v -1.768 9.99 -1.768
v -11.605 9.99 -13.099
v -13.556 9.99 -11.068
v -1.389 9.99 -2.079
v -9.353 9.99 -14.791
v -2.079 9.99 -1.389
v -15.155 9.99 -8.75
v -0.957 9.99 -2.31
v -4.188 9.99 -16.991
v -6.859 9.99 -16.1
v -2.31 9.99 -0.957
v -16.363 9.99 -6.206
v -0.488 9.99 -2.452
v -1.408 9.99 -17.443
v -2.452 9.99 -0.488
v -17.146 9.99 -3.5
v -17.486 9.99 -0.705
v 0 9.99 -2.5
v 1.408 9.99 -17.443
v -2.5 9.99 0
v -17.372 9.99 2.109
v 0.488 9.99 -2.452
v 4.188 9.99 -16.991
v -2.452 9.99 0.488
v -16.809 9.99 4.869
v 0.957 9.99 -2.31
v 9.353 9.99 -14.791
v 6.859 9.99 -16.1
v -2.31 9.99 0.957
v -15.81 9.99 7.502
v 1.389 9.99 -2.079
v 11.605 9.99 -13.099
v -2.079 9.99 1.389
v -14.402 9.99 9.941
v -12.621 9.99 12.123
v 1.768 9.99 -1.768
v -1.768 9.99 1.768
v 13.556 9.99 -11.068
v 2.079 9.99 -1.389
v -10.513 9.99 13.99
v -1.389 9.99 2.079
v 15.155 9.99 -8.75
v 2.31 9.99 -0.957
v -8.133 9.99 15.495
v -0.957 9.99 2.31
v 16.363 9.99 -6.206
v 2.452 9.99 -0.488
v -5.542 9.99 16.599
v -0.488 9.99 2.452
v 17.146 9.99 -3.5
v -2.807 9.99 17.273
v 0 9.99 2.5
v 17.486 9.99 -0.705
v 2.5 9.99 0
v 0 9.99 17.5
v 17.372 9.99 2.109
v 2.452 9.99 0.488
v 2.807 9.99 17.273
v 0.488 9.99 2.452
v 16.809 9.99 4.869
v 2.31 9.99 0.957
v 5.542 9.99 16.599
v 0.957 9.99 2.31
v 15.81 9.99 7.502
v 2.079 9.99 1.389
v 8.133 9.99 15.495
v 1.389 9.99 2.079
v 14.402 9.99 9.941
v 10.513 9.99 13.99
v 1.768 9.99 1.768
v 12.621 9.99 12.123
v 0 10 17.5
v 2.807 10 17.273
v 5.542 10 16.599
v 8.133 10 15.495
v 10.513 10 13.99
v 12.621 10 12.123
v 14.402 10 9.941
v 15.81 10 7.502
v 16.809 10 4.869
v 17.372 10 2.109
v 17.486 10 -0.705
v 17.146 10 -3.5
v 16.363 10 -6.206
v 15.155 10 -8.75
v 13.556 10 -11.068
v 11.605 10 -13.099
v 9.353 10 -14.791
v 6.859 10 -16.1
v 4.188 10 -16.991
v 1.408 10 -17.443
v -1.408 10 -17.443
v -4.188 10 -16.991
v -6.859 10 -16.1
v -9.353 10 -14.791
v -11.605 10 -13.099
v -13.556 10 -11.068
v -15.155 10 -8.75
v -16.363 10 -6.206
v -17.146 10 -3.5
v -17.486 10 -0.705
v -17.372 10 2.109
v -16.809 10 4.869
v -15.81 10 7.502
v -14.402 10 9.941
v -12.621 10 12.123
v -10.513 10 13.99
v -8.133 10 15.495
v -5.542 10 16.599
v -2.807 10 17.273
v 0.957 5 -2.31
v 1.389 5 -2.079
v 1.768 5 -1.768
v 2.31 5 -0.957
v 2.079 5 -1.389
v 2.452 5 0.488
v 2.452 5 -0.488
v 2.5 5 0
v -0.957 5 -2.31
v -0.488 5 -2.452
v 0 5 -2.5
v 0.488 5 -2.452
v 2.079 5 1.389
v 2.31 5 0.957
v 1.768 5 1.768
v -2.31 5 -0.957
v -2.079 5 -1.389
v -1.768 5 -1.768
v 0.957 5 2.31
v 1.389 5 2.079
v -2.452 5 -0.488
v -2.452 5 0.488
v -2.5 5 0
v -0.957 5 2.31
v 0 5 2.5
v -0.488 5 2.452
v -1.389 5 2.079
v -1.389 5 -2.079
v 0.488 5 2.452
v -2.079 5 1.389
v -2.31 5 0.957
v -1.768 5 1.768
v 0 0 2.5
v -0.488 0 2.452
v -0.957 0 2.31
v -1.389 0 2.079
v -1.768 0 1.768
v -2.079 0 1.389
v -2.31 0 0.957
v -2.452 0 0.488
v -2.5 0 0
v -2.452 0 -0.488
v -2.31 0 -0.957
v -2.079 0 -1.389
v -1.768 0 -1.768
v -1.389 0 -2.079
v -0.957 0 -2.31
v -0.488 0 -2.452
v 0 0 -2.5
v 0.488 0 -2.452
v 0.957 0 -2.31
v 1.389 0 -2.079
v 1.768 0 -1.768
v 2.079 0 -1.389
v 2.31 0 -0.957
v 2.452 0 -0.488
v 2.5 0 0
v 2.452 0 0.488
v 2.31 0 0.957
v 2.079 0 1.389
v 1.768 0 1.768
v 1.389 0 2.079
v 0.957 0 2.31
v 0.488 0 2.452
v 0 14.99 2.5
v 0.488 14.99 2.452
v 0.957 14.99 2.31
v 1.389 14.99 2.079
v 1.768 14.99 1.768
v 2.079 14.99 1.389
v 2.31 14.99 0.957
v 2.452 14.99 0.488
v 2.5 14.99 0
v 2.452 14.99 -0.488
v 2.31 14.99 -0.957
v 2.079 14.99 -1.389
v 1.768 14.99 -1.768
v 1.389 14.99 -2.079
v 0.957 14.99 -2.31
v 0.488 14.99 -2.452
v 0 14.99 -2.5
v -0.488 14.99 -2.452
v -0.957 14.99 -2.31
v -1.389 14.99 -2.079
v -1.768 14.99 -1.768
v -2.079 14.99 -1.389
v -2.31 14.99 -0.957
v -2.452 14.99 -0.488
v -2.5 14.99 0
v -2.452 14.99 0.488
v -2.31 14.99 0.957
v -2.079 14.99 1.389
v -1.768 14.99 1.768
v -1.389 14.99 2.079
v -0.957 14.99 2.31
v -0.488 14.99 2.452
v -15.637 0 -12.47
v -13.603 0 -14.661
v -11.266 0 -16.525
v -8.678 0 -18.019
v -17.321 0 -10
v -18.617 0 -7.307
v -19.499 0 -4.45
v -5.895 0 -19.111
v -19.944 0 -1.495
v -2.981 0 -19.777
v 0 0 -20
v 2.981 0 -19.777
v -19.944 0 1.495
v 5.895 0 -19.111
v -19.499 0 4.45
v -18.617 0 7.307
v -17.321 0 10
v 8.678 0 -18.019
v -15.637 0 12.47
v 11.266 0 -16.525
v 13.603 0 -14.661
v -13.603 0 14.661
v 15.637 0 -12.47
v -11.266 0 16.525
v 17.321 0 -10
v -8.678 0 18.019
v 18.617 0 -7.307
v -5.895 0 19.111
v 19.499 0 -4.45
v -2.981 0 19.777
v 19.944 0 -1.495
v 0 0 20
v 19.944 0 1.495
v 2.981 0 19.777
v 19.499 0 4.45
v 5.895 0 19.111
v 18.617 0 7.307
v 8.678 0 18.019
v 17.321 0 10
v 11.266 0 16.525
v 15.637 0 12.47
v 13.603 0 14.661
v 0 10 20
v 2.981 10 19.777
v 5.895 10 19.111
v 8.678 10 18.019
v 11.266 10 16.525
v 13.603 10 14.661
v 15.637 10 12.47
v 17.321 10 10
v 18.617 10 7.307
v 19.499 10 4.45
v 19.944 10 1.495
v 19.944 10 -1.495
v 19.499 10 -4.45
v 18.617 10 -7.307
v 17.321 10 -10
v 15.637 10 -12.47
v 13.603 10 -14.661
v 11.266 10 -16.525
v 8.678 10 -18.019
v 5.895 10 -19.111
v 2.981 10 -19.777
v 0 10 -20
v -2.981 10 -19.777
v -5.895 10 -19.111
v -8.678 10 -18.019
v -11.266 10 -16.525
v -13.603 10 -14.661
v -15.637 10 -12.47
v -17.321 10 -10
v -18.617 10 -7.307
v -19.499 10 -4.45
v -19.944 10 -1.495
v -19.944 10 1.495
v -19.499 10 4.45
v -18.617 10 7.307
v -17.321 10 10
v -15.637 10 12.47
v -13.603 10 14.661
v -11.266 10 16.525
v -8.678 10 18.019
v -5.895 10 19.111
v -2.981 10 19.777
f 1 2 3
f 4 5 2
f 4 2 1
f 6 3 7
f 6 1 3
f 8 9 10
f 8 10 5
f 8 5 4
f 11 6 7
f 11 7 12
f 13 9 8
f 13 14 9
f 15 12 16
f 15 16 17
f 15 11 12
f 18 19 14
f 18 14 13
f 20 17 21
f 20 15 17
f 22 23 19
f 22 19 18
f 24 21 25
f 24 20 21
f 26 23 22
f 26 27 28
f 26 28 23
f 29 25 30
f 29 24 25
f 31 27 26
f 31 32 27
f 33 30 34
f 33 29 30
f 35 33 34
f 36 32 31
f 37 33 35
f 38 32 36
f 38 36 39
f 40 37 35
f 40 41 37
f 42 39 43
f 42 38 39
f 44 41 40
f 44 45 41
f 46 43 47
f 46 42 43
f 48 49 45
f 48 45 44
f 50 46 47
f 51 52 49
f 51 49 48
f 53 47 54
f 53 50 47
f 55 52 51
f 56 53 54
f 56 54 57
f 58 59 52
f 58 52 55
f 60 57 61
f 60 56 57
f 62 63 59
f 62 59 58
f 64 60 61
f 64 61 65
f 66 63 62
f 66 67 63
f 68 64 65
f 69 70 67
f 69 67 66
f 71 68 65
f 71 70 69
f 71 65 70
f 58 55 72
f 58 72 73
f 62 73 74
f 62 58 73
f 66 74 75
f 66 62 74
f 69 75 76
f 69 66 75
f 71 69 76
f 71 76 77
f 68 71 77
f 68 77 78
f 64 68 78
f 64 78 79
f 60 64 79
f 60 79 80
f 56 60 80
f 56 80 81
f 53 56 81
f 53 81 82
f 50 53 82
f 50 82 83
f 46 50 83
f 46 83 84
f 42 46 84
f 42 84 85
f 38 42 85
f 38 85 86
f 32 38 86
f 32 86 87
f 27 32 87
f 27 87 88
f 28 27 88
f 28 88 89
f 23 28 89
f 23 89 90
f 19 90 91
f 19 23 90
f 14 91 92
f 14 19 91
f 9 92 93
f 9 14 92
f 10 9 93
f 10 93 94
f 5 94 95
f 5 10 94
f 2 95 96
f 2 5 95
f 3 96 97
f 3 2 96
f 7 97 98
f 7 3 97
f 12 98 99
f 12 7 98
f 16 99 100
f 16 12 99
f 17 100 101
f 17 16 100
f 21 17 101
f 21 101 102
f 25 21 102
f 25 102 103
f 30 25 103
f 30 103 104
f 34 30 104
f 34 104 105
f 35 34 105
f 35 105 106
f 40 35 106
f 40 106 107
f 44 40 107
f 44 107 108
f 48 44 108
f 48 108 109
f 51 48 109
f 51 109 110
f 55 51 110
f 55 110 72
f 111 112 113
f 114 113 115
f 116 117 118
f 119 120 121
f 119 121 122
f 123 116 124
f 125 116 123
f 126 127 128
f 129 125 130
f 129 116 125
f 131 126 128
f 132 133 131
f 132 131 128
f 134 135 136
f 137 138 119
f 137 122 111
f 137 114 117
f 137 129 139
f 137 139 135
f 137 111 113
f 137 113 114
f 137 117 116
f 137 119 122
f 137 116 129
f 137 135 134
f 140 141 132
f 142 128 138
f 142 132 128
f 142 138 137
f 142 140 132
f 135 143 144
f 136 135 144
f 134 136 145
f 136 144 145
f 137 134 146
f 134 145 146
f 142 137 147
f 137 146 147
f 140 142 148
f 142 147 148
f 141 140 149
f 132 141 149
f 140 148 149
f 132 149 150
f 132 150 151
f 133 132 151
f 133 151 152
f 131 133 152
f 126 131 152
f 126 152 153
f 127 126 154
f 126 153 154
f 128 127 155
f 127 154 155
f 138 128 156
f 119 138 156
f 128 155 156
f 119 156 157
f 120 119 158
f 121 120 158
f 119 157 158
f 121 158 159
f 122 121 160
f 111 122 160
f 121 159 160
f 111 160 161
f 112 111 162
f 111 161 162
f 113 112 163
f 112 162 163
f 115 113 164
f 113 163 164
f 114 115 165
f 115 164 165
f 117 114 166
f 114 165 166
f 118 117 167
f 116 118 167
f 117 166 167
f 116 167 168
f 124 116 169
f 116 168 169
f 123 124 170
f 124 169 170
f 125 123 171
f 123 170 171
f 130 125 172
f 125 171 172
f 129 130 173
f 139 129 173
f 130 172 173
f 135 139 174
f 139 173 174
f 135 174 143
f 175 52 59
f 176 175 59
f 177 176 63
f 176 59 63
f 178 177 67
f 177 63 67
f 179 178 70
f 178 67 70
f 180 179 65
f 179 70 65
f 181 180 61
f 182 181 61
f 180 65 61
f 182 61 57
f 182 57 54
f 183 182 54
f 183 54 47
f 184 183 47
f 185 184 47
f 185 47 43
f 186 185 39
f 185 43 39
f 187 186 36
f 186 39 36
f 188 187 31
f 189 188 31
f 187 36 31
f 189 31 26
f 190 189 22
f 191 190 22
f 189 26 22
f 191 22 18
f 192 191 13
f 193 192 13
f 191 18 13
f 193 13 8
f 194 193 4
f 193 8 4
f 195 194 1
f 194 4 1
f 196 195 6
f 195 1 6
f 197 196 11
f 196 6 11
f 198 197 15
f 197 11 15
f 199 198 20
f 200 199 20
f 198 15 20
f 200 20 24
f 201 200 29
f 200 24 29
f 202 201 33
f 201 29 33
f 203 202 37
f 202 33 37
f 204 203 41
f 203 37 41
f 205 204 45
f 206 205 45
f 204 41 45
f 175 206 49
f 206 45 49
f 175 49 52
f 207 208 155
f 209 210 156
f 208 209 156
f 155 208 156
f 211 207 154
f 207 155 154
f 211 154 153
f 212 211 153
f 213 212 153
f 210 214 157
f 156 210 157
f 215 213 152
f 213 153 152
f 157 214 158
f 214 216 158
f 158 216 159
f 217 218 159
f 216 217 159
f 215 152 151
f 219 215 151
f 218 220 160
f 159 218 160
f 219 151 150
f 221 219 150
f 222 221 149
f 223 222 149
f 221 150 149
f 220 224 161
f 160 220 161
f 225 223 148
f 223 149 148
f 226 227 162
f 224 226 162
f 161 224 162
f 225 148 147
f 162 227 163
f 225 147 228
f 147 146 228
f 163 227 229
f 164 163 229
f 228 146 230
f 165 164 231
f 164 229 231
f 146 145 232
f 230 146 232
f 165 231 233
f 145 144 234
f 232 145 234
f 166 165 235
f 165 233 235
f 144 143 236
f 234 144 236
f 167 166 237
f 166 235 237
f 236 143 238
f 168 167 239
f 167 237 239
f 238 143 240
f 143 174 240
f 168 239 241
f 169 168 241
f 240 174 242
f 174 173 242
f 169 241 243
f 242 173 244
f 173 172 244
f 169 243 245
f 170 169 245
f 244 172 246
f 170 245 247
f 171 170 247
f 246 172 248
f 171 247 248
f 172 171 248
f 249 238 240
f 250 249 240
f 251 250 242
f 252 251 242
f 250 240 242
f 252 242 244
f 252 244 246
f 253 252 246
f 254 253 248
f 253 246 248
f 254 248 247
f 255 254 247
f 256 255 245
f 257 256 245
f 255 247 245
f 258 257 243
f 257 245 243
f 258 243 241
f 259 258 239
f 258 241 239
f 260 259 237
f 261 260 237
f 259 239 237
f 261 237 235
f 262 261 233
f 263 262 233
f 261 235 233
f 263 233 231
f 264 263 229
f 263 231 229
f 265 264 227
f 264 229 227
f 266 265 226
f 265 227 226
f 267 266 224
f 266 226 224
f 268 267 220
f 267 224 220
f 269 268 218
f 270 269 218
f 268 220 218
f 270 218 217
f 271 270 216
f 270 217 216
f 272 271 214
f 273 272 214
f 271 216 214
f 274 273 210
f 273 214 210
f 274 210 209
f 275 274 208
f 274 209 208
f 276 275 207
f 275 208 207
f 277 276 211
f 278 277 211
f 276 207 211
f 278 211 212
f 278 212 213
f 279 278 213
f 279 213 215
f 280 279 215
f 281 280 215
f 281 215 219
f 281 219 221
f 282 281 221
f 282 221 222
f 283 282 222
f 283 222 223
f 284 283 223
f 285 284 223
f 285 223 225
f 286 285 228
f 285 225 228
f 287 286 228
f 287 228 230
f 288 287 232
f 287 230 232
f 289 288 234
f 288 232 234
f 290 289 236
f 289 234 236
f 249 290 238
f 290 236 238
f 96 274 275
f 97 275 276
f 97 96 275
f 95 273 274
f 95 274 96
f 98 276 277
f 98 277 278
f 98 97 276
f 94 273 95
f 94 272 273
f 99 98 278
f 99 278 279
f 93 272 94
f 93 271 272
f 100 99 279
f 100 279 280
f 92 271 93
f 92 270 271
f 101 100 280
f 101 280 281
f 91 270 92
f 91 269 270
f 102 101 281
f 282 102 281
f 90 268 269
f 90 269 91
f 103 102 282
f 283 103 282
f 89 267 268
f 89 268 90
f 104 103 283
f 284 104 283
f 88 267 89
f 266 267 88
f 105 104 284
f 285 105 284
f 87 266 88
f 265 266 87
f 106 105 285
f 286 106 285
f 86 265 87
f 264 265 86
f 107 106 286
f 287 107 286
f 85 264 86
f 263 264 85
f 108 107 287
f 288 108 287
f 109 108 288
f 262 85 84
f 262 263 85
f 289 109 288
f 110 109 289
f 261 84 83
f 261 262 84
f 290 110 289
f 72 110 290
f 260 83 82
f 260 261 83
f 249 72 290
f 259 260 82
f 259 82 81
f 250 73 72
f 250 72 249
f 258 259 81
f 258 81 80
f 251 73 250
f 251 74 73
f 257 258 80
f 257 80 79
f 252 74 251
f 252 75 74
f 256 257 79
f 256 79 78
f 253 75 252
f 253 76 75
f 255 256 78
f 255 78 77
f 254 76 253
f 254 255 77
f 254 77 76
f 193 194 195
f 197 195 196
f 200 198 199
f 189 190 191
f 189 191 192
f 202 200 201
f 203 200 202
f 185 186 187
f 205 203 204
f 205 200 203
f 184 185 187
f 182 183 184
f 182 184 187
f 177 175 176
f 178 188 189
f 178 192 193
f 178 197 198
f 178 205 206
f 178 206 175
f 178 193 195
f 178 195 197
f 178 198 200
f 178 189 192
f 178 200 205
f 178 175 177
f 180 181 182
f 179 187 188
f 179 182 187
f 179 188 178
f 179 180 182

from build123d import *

# Parameters (mm, degrees)
SKETCH1_R           = 20
SKETCH1_R_2         = 17.5
BOSS_EXTRUDE1_DEPTH = 10
SKETCH2_R           = 17.5
BOSS_EXTRUDE3_DEPTH = 9.99
SKETCH4_R           = 2.5
BOSS_EXTRUDE4_DEPTH = 5
SKETCH3_R           = 2.5
CUT_EXTRUDE2_DEPTH  = 5


with BuildPart() as part:
    # Sketch1 → Boss-Extrude1 (new body)
    with BuildSketch(Plane(origin=(0, 0, 0), x_dir=(1, 0, 0), z_dir=(0, 1, 0))):
        with Locations(Location((0, 0, 0), (0, 0, 270))):
            Circle(SKETCH1_R)
        with Locations(Location((0, 0, 0), (0, 0, 270))):
            Circle(SKETCH1_R_2, mode=Mode.SUBTRACT)
    extrude(amount=BOSS_EXTRUDE1_DEPTH)



with BuildPart() as body_2:
    # Sketch2 → Boss-Extrude3 (new body)
    with BuildSketch(Plane(origin=(0, 0, 0), x_dir=(1, 0, 0), z_dir=(0, 1, 0))):
        with Locations(Location((0, 0, 0), (0, 0, 270))):
            Circle(SKETCH2_R)
    extrude(amount=BOSS_EXTRUDE3_DEPTH)


with BuildPart() as part_1:
    add(part.part)

    add(body_2.part)  # Boss-Extrude4 merges body 2
    # Sketch4 → Boss-Extrude4 (add)
    with BuildSketch(Plane(origin=(0, 9.99, 0), x_dir=(1, 0, 0), z_dir=(0, 1, 0))):
        with Locations(Location((0, 0, 0), (0, 0, 270))):
            Circle(SKETCH4_R)
    extrude(amount=BOSS_EXTRUDE4_DEPTH)

    # Sketch3 → Cut-Extrude2 (cut)
    with BuildSketch(Plane.XZ):
        with Locations(Location((0, 0, 0), (0, 0, 90))):
            Circle(SKETCH3_R)
    extrude(amount=-CUT_EXTRUDE2_DEPTH, mode=Mode.SUBTRACT)


solid = part_1.part
